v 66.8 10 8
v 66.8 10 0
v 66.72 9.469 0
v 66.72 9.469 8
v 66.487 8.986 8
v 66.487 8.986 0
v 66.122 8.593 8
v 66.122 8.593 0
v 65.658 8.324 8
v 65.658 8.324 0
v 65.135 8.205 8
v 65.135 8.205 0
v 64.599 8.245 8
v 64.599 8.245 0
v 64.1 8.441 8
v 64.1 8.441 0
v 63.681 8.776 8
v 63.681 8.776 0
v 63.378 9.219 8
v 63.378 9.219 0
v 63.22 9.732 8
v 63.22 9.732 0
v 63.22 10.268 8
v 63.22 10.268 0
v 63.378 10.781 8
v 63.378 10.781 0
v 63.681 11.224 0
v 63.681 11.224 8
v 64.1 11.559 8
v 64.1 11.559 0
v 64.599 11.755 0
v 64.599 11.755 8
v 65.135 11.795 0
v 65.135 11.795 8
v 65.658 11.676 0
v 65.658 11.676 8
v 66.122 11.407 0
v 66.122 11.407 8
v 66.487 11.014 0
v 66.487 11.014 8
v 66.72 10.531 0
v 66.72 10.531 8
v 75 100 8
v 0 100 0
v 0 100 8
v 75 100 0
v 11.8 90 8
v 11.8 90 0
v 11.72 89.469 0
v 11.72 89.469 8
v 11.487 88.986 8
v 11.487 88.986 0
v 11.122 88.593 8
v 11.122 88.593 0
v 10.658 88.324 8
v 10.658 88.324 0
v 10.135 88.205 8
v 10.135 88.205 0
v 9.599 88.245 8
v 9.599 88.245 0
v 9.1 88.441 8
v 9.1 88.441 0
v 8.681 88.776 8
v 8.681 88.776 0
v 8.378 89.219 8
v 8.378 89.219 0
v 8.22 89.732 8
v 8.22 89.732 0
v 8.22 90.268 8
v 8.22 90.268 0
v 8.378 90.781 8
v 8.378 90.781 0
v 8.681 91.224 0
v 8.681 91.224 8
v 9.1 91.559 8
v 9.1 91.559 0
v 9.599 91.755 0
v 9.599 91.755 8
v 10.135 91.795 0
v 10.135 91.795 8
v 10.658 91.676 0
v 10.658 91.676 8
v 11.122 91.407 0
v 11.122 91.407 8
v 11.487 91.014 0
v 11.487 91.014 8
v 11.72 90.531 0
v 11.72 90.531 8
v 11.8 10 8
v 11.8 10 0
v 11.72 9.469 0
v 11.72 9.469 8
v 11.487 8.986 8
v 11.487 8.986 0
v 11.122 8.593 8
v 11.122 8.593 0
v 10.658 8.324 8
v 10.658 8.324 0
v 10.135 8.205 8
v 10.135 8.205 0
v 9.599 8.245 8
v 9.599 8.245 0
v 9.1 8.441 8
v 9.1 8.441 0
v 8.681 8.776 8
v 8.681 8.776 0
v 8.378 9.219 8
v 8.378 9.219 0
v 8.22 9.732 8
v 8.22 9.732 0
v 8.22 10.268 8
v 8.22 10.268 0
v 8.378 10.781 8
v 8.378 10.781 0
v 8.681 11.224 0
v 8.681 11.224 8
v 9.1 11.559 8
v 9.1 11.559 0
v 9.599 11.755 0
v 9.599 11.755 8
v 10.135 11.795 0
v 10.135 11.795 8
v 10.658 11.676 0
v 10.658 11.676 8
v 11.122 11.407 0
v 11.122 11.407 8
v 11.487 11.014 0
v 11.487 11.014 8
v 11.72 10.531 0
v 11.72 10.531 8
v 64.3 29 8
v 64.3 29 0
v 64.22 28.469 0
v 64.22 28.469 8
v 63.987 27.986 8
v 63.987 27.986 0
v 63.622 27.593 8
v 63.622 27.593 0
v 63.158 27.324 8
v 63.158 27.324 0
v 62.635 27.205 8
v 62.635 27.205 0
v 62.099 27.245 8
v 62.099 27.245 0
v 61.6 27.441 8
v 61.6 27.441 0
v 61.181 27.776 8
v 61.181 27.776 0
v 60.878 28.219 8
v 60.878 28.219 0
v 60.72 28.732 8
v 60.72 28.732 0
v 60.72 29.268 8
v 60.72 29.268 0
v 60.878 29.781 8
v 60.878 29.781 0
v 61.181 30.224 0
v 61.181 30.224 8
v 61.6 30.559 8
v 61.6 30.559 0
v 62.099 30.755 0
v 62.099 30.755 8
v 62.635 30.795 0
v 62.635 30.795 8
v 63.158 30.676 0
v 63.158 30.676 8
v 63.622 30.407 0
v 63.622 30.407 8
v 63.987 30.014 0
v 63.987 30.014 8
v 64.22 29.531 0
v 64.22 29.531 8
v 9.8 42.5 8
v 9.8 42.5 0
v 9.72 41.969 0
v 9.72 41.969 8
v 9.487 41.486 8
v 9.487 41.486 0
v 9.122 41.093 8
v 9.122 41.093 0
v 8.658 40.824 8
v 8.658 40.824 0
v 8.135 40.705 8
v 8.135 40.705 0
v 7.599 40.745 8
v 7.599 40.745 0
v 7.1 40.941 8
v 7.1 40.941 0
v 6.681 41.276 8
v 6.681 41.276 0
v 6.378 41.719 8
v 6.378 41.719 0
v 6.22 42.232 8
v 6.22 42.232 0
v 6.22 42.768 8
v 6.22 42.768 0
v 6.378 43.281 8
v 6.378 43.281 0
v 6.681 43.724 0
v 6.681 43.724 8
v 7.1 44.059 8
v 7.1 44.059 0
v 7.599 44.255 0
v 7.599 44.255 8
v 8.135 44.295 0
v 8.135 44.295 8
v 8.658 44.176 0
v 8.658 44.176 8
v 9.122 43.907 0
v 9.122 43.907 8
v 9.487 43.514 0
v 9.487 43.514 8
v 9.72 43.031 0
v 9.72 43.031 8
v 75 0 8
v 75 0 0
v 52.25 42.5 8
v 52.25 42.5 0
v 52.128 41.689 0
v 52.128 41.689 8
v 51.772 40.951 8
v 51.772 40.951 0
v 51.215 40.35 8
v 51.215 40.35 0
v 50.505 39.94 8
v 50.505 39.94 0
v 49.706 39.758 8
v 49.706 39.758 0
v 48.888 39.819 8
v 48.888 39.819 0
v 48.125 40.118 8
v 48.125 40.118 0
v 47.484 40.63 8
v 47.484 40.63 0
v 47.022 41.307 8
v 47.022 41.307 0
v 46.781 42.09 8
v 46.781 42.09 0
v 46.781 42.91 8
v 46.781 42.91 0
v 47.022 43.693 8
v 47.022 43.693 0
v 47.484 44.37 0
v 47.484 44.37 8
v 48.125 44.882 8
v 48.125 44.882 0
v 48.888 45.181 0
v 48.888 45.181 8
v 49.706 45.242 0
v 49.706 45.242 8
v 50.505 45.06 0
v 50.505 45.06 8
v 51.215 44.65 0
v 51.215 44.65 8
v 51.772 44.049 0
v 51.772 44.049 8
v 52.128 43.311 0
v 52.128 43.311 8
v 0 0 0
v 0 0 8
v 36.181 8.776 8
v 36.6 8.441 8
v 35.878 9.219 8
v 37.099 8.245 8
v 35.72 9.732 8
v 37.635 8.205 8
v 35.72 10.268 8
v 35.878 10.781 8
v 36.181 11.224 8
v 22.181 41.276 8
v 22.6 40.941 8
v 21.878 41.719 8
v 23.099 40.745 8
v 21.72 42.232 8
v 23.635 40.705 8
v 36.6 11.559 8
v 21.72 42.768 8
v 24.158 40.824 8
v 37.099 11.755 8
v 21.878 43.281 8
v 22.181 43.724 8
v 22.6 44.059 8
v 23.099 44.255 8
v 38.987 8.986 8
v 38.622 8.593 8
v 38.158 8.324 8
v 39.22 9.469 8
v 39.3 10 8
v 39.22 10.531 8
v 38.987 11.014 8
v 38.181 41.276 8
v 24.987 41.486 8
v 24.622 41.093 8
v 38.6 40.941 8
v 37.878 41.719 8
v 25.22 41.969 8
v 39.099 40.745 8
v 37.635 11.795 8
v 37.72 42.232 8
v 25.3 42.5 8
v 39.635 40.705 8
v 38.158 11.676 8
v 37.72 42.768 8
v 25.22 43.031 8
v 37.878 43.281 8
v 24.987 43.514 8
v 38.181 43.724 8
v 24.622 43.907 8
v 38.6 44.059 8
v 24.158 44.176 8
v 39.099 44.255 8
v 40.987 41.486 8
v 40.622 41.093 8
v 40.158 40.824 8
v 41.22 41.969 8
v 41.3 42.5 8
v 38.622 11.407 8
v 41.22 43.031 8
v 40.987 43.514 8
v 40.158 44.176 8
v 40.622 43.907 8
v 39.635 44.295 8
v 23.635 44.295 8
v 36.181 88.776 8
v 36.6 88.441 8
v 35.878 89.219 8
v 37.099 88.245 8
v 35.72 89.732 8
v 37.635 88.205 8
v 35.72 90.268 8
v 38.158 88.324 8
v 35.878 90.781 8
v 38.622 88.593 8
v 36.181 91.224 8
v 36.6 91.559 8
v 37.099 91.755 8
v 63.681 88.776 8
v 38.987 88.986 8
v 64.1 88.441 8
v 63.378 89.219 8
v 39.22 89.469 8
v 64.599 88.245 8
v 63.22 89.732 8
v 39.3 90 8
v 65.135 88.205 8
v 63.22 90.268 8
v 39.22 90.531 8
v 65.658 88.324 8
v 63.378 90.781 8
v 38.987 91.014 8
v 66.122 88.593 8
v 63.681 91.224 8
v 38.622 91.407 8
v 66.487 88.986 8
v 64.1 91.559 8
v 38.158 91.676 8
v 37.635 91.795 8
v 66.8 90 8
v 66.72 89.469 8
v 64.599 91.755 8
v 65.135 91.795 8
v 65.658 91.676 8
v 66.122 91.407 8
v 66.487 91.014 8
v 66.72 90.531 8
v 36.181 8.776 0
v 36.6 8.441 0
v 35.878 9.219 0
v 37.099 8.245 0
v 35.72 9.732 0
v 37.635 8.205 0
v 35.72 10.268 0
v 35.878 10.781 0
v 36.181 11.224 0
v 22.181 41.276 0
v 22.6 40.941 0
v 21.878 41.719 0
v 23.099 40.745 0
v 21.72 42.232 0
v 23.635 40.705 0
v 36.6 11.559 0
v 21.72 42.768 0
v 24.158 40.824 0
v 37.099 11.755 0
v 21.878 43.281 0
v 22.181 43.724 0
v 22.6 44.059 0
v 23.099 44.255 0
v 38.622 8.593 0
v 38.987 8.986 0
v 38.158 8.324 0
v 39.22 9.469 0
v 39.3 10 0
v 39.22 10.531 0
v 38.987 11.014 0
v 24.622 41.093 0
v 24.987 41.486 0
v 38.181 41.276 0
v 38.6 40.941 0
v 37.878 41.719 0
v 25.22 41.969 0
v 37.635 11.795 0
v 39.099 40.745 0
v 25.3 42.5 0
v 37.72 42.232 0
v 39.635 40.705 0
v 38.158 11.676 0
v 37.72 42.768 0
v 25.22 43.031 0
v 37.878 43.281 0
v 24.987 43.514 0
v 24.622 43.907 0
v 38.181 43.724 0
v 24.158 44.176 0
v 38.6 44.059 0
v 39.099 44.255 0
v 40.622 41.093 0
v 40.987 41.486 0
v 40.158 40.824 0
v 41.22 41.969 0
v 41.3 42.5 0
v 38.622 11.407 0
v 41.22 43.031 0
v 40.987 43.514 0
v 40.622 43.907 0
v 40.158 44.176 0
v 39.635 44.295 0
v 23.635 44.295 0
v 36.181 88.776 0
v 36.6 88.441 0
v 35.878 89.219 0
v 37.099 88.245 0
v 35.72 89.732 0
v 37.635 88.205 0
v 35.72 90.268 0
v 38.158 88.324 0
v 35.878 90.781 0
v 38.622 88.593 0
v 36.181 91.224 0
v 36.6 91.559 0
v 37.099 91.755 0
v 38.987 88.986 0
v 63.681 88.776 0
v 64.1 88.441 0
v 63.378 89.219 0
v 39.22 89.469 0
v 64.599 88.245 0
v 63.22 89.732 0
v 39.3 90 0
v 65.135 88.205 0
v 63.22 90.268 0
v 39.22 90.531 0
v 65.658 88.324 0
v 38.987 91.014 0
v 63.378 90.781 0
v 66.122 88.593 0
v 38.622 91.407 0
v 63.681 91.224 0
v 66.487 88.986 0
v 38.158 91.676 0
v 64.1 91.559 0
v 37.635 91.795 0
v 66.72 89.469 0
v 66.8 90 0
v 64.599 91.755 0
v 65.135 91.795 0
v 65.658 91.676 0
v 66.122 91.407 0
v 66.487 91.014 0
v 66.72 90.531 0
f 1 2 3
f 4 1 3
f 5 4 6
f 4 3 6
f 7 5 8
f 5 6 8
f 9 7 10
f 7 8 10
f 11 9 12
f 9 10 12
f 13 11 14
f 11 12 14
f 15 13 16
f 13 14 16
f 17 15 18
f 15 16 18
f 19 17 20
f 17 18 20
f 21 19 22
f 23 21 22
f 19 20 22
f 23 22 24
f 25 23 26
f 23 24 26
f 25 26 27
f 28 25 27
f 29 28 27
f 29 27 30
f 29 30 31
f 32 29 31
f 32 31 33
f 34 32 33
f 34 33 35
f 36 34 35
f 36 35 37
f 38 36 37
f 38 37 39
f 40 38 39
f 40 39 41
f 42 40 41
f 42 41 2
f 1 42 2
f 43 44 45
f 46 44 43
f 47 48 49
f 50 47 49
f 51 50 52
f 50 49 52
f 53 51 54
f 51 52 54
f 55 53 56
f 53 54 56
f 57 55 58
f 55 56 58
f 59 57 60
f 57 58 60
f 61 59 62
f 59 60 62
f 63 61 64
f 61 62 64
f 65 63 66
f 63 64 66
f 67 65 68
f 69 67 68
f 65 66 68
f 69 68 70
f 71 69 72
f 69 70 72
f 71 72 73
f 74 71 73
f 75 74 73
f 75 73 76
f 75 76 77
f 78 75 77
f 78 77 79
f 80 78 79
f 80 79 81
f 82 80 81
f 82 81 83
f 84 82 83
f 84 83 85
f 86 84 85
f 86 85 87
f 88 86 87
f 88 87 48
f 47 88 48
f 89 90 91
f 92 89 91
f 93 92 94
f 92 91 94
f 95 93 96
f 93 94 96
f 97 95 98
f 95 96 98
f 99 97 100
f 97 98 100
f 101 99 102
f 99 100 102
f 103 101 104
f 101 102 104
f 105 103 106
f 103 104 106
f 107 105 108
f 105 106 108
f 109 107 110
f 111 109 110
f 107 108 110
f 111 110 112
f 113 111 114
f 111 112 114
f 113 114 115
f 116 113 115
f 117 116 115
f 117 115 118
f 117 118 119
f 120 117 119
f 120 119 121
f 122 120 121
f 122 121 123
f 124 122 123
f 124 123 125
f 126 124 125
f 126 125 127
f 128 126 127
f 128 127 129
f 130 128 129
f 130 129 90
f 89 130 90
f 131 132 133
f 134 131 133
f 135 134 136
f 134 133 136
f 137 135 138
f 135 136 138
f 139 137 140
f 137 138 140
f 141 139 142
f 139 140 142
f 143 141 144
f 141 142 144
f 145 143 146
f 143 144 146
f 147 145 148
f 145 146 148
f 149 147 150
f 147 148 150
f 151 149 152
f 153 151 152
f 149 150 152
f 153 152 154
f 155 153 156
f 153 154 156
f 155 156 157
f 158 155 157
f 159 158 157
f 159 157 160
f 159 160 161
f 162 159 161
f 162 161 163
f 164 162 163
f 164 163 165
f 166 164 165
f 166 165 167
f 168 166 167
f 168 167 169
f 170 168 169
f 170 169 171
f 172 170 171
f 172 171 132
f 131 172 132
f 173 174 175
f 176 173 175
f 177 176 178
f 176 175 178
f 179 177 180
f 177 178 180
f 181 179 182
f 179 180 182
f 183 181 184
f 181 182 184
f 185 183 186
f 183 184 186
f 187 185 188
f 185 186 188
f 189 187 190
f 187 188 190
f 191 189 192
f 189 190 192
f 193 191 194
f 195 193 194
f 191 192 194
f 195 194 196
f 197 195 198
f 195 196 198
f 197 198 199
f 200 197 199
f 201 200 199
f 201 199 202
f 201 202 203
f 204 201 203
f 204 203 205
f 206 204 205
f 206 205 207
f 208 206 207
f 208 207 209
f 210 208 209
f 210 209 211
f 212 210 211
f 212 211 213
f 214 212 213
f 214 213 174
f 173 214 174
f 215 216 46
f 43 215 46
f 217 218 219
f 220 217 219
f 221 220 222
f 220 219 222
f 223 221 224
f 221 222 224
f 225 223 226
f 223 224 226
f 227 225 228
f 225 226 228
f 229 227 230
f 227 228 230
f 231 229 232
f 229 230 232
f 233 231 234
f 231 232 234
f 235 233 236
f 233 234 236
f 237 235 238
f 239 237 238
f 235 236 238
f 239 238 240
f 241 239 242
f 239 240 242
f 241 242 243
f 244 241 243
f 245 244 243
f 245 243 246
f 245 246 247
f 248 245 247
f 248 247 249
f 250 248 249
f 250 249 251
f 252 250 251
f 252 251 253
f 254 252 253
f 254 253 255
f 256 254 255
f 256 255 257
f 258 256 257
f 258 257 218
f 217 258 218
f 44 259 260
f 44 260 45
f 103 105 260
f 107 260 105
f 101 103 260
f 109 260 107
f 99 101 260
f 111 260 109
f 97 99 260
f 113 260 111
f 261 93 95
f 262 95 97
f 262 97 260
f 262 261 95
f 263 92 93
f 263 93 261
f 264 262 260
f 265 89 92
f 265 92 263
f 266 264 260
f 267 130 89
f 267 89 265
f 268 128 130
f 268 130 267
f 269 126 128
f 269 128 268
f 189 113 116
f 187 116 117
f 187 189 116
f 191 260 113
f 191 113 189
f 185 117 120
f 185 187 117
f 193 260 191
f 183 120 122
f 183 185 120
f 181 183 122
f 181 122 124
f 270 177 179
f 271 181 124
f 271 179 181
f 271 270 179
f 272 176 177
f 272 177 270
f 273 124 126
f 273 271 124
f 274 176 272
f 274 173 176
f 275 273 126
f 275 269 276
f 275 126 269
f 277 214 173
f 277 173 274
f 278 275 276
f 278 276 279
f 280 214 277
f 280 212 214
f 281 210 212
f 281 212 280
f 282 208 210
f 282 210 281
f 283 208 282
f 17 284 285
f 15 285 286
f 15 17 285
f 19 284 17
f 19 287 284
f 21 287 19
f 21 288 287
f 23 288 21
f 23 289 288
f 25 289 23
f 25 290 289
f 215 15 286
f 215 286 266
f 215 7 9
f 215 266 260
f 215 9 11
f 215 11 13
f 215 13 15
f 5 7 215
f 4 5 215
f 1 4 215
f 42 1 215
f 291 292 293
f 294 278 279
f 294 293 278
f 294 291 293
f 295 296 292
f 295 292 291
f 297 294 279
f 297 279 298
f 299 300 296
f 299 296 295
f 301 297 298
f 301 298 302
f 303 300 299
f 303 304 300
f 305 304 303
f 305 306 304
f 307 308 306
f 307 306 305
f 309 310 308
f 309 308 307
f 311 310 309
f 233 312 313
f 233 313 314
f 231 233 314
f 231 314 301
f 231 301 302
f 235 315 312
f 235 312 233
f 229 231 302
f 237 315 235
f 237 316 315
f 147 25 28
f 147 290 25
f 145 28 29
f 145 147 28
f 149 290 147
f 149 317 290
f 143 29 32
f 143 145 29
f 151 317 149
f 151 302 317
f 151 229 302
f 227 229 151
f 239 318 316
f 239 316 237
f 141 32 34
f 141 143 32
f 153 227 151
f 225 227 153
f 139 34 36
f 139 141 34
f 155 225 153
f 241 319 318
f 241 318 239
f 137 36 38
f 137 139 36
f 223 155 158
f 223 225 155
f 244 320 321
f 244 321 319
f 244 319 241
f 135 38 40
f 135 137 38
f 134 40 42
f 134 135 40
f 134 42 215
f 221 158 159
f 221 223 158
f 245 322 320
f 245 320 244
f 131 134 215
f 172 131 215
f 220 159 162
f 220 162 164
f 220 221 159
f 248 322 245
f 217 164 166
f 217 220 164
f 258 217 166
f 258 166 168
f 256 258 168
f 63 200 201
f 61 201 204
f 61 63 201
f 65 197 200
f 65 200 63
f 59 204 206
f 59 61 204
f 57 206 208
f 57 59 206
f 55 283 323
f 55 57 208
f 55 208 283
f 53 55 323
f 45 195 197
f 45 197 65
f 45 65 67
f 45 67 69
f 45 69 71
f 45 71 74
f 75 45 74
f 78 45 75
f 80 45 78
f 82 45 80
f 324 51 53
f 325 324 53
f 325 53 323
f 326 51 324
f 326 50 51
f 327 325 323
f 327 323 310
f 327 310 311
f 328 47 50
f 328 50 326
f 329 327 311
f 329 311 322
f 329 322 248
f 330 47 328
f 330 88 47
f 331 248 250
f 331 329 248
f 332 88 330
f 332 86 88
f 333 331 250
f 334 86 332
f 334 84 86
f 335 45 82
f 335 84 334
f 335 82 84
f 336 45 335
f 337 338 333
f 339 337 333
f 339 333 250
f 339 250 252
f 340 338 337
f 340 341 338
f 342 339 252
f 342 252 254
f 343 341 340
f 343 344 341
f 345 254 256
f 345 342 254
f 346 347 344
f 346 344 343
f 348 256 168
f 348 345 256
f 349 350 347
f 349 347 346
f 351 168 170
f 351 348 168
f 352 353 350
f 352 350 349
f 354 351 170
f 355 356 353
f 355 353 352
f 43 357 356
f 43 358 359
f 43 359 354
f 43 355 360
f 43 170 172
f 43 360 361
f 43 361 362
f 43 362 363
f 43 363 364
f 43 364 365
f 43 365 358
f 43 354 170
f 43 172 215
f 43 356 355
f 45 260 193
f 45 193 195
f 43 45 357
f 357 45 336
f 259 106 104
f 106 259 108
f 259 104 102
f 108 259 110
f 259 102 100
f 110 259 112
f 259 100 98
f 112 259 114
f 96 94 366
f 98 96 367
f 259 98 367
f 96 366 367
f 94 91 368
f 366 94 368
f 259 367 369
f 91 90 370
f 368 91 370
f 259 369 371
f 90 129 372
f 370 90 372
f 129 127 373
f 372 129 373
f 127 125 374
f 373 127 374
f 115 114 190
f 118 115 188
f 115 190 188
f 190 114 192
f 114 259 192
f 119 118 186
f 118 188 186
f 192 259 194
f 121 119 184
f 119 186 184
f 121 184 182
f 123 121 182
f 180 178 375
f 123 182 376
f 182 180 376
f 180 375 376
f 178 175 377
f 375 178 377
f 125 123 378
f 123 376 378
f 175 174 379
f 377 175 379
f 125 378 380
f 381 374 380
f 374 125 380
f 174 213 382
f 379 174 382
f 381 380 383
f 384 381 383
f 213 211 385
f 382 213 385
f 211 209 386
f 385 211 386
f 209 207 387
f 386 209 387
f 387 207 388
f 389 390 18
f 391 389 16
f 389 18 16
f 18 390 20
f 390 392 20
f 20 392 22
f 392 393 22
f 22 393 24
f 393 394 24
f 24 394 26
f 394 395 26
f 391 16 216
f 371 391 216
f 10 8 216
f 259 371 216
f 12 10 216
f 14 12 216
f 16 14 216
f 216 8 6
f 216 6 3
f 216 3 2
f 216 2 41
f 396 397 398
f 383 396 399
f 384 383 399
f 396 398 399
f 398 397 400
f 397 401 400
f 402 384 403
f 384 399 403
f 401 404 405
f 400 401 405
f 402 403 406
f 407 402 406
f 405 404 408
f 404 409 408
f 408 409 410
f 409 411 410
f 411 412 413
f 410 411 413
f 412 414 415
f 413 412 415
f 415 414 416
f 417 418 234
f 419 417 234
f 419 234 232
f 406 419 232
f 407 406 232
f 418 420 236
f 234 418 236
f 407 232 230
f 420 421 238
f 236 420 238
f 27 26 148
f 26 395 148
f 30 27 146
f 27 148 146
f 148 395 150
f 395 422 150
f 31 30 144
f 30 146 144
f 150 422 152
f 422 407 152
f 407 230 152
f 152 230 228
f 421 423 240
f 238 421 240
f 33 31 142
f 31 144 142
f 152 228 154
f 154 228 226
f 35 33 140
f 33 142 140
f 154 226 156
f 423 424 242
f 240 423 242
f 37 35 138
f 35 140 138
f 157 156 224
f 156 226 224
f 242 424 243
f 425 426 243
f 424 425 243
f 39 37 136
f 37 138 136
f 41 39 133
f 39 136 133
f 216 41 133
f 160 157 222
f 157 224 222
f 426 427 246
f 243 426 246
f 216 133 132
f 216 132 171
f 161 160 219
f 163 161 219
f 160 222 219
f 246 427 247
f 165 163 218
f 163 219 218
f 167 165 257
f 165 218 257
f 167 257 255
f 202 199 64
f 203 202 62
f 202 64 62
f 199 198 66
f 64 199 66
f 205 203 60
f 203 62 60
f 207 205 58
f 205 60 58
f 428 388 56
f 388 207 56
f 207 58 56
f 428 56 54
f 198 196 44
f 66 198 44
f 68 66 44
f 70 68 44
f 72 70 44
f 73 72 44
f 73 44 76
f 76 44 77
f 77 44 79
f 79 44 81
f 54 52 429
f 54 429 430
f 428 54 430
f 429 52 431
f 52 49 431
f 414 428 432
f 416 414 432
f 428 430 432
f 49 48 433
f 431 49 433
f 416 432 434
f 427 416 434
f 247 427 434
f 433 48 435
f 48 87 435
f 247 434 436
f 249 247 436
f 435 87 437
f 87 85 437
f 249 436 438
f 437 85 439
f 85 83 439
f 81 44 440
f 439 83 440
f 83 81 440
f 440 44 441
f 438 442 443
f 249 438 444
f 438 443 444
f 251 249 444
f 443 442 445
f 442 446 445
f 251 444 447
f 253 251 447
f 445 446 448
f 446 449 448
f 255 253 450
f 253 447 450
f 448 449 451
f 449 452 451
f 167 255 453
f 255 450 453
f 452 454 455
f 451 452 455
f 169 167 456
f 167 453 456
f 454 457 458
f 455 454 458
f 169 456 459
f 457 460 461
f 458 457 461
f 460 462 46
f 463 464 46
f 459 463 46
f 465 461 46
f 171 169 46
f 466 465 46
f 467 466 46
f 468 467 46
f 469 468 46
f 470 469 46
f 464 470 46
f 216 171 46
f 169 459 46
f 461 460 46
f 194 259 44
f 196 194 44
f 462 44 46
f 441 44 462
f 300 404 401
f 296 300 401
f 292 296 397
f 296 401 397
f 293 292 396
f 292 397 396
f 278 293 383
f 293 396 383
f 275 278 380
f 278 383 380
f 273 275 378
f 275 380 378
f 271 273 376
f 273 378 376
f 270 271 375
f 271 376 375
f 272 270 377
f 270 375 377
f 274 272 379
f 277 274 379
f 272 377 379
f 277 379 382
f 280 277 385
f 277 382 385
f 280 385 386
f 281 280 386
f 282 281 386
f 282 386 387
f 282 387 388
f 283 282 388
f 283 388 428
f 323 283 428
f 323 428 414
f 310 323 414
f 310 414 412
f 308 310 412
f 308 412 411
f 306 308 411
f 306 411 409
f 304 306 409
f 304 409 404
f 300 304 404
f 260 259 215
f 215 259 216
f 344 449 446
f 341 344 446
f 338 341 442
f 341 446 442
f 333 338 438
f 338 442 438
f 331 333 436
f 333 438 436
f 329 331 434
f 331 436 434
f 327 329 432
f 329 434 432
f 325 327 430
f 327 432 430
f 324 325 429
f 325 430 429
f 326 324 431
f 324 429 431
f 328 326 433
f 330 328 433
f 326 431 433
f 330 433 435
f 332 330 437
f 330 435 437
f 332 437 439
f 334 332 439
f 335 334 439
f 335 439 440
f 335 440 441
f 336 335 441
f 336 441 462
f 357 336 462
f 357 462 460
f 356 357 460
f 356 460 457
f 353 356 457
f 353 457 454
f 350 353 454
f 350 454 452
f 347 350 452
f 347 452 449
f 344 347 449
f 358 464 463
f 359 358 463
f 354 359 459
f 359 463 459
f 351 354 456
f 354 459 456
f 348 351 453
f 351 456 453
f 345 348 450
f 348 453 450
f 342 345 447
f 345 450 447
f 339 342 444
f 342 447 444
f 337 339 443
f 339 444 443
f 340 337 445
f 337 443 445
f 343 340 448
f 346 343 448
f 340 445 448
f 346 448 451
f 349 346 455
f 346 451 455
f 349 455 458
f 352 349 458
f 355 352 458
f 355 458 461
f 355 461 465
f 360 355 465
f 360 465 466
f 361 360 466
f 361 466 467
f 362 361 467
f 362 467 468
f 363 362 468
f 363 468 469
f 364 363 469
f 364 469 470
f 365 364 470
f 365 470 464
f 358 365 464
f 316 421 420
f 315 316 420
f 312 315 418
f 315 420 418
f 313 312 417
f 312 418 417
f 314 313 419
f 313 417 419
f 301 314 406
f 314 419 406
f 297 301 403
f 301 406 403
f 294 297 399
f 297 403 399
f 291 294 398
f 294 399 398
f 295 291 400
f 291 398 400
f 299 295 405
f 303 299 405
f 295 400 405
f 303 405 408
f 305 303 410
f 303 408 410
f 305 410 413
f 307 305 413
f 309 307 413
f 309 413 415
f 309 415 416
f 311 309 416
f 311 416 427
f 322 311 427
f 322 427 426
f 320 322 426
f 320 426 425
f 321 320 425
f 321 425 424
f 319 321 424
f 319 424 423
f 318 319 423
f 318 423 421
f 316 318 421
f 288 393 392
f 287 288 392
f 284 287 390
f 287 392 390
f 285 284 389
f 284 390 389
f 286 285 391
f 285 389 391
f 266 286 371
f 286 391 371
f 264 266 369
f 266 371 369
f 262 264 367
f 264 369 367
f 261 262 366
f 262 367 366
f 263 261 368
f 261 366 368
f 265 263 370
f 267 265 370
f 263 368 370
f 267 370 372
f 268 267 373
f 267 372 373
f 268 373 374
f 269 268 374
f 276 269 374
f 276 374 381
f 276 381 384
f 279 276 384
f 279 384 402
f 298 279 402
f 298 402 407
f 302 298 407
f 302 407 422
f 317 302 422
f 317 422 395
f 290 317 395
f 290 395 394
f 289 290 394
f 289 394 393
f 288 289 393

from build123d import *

# Parameters (mm, degrees)
BOX_W         = 75
BOX_H         = 100
BOX_DEPTH     = 8
SKETCH_R      = 1.8
HOLE_DEPTH    = 8.001
SKETCH001_R   = 1.8
HOLE001_DEPTH = 25
SKETCH003_R   = 2.75
HOLE002_DEPTH = 8.001


with BuildPart() as part:
    # Box → Box (join)
    with BuildSketch(Plane.XY):
        with Locations((37.5, 50)):
            Rectangle(BOX_W, BOX_H)
    extrude(amount=BOX_DEPTH)

    # Sketch (on Face5 of Box) → Hole (cut, through all)
    with BuildSketch(Plane(origin=(0, 0, 0), x_dir=(1, 0, 0), z_dir=(0, 0, -1))):
        with Locations((10, -10)):
            Circle(SKETCH_R)
        with Locations((37.5, -10)):
            Circle(SKETCH_R)
        with Locations((65, -10)):
            Circle(SKETCH_R)
        with Locations((10, -90)):
            Circle(SKETCH_R)
        with Locations((37.5, -90)):
            Circle(SKETCH_R)
        with Locations((65, -90)):
            Circle(SKETCH_R)
    extrude(amount=-HOLE_DEPTH, mode=Mode.SUBTRACT)

    # Sketch001 (on Face5 of Hole) → Hole001 (cut)
    with BuildSketch(Plane(origin=(0, 0, 0), x_dir=(1, 0, 0), z_dir=(0, 0, -1))):
        with Locations((39.5, -42.5)):
            Circle(SKETCH001_R)
        with Locations((23.5, -42.5)):
            Circle(SKETCH001_R)
        with Locations((8, -42.5)):
            Circle(SKETCH001_R)
        with Locations((62.5, -29)):
            Circle(SKETCH001_R)
    extrude(amount=-HOLE001_DEPTH, mode=Mode.SUBTRACT)

    # Sketch003 (on Face5 of Hole001) → Hole002 (cut, through all)
    with BuildSketch(Plane(origin=(0, 0, 0), x_dir=(1, 0, 0), z_dir=(0, 0, -1))):
        with Locations((49.5, -42.5)):
            Circle(SKETCH003_R)
    extrude(amount=-HOLE002_DEPTH, mode=Mode.SUBTRACT)


solid = part.part
